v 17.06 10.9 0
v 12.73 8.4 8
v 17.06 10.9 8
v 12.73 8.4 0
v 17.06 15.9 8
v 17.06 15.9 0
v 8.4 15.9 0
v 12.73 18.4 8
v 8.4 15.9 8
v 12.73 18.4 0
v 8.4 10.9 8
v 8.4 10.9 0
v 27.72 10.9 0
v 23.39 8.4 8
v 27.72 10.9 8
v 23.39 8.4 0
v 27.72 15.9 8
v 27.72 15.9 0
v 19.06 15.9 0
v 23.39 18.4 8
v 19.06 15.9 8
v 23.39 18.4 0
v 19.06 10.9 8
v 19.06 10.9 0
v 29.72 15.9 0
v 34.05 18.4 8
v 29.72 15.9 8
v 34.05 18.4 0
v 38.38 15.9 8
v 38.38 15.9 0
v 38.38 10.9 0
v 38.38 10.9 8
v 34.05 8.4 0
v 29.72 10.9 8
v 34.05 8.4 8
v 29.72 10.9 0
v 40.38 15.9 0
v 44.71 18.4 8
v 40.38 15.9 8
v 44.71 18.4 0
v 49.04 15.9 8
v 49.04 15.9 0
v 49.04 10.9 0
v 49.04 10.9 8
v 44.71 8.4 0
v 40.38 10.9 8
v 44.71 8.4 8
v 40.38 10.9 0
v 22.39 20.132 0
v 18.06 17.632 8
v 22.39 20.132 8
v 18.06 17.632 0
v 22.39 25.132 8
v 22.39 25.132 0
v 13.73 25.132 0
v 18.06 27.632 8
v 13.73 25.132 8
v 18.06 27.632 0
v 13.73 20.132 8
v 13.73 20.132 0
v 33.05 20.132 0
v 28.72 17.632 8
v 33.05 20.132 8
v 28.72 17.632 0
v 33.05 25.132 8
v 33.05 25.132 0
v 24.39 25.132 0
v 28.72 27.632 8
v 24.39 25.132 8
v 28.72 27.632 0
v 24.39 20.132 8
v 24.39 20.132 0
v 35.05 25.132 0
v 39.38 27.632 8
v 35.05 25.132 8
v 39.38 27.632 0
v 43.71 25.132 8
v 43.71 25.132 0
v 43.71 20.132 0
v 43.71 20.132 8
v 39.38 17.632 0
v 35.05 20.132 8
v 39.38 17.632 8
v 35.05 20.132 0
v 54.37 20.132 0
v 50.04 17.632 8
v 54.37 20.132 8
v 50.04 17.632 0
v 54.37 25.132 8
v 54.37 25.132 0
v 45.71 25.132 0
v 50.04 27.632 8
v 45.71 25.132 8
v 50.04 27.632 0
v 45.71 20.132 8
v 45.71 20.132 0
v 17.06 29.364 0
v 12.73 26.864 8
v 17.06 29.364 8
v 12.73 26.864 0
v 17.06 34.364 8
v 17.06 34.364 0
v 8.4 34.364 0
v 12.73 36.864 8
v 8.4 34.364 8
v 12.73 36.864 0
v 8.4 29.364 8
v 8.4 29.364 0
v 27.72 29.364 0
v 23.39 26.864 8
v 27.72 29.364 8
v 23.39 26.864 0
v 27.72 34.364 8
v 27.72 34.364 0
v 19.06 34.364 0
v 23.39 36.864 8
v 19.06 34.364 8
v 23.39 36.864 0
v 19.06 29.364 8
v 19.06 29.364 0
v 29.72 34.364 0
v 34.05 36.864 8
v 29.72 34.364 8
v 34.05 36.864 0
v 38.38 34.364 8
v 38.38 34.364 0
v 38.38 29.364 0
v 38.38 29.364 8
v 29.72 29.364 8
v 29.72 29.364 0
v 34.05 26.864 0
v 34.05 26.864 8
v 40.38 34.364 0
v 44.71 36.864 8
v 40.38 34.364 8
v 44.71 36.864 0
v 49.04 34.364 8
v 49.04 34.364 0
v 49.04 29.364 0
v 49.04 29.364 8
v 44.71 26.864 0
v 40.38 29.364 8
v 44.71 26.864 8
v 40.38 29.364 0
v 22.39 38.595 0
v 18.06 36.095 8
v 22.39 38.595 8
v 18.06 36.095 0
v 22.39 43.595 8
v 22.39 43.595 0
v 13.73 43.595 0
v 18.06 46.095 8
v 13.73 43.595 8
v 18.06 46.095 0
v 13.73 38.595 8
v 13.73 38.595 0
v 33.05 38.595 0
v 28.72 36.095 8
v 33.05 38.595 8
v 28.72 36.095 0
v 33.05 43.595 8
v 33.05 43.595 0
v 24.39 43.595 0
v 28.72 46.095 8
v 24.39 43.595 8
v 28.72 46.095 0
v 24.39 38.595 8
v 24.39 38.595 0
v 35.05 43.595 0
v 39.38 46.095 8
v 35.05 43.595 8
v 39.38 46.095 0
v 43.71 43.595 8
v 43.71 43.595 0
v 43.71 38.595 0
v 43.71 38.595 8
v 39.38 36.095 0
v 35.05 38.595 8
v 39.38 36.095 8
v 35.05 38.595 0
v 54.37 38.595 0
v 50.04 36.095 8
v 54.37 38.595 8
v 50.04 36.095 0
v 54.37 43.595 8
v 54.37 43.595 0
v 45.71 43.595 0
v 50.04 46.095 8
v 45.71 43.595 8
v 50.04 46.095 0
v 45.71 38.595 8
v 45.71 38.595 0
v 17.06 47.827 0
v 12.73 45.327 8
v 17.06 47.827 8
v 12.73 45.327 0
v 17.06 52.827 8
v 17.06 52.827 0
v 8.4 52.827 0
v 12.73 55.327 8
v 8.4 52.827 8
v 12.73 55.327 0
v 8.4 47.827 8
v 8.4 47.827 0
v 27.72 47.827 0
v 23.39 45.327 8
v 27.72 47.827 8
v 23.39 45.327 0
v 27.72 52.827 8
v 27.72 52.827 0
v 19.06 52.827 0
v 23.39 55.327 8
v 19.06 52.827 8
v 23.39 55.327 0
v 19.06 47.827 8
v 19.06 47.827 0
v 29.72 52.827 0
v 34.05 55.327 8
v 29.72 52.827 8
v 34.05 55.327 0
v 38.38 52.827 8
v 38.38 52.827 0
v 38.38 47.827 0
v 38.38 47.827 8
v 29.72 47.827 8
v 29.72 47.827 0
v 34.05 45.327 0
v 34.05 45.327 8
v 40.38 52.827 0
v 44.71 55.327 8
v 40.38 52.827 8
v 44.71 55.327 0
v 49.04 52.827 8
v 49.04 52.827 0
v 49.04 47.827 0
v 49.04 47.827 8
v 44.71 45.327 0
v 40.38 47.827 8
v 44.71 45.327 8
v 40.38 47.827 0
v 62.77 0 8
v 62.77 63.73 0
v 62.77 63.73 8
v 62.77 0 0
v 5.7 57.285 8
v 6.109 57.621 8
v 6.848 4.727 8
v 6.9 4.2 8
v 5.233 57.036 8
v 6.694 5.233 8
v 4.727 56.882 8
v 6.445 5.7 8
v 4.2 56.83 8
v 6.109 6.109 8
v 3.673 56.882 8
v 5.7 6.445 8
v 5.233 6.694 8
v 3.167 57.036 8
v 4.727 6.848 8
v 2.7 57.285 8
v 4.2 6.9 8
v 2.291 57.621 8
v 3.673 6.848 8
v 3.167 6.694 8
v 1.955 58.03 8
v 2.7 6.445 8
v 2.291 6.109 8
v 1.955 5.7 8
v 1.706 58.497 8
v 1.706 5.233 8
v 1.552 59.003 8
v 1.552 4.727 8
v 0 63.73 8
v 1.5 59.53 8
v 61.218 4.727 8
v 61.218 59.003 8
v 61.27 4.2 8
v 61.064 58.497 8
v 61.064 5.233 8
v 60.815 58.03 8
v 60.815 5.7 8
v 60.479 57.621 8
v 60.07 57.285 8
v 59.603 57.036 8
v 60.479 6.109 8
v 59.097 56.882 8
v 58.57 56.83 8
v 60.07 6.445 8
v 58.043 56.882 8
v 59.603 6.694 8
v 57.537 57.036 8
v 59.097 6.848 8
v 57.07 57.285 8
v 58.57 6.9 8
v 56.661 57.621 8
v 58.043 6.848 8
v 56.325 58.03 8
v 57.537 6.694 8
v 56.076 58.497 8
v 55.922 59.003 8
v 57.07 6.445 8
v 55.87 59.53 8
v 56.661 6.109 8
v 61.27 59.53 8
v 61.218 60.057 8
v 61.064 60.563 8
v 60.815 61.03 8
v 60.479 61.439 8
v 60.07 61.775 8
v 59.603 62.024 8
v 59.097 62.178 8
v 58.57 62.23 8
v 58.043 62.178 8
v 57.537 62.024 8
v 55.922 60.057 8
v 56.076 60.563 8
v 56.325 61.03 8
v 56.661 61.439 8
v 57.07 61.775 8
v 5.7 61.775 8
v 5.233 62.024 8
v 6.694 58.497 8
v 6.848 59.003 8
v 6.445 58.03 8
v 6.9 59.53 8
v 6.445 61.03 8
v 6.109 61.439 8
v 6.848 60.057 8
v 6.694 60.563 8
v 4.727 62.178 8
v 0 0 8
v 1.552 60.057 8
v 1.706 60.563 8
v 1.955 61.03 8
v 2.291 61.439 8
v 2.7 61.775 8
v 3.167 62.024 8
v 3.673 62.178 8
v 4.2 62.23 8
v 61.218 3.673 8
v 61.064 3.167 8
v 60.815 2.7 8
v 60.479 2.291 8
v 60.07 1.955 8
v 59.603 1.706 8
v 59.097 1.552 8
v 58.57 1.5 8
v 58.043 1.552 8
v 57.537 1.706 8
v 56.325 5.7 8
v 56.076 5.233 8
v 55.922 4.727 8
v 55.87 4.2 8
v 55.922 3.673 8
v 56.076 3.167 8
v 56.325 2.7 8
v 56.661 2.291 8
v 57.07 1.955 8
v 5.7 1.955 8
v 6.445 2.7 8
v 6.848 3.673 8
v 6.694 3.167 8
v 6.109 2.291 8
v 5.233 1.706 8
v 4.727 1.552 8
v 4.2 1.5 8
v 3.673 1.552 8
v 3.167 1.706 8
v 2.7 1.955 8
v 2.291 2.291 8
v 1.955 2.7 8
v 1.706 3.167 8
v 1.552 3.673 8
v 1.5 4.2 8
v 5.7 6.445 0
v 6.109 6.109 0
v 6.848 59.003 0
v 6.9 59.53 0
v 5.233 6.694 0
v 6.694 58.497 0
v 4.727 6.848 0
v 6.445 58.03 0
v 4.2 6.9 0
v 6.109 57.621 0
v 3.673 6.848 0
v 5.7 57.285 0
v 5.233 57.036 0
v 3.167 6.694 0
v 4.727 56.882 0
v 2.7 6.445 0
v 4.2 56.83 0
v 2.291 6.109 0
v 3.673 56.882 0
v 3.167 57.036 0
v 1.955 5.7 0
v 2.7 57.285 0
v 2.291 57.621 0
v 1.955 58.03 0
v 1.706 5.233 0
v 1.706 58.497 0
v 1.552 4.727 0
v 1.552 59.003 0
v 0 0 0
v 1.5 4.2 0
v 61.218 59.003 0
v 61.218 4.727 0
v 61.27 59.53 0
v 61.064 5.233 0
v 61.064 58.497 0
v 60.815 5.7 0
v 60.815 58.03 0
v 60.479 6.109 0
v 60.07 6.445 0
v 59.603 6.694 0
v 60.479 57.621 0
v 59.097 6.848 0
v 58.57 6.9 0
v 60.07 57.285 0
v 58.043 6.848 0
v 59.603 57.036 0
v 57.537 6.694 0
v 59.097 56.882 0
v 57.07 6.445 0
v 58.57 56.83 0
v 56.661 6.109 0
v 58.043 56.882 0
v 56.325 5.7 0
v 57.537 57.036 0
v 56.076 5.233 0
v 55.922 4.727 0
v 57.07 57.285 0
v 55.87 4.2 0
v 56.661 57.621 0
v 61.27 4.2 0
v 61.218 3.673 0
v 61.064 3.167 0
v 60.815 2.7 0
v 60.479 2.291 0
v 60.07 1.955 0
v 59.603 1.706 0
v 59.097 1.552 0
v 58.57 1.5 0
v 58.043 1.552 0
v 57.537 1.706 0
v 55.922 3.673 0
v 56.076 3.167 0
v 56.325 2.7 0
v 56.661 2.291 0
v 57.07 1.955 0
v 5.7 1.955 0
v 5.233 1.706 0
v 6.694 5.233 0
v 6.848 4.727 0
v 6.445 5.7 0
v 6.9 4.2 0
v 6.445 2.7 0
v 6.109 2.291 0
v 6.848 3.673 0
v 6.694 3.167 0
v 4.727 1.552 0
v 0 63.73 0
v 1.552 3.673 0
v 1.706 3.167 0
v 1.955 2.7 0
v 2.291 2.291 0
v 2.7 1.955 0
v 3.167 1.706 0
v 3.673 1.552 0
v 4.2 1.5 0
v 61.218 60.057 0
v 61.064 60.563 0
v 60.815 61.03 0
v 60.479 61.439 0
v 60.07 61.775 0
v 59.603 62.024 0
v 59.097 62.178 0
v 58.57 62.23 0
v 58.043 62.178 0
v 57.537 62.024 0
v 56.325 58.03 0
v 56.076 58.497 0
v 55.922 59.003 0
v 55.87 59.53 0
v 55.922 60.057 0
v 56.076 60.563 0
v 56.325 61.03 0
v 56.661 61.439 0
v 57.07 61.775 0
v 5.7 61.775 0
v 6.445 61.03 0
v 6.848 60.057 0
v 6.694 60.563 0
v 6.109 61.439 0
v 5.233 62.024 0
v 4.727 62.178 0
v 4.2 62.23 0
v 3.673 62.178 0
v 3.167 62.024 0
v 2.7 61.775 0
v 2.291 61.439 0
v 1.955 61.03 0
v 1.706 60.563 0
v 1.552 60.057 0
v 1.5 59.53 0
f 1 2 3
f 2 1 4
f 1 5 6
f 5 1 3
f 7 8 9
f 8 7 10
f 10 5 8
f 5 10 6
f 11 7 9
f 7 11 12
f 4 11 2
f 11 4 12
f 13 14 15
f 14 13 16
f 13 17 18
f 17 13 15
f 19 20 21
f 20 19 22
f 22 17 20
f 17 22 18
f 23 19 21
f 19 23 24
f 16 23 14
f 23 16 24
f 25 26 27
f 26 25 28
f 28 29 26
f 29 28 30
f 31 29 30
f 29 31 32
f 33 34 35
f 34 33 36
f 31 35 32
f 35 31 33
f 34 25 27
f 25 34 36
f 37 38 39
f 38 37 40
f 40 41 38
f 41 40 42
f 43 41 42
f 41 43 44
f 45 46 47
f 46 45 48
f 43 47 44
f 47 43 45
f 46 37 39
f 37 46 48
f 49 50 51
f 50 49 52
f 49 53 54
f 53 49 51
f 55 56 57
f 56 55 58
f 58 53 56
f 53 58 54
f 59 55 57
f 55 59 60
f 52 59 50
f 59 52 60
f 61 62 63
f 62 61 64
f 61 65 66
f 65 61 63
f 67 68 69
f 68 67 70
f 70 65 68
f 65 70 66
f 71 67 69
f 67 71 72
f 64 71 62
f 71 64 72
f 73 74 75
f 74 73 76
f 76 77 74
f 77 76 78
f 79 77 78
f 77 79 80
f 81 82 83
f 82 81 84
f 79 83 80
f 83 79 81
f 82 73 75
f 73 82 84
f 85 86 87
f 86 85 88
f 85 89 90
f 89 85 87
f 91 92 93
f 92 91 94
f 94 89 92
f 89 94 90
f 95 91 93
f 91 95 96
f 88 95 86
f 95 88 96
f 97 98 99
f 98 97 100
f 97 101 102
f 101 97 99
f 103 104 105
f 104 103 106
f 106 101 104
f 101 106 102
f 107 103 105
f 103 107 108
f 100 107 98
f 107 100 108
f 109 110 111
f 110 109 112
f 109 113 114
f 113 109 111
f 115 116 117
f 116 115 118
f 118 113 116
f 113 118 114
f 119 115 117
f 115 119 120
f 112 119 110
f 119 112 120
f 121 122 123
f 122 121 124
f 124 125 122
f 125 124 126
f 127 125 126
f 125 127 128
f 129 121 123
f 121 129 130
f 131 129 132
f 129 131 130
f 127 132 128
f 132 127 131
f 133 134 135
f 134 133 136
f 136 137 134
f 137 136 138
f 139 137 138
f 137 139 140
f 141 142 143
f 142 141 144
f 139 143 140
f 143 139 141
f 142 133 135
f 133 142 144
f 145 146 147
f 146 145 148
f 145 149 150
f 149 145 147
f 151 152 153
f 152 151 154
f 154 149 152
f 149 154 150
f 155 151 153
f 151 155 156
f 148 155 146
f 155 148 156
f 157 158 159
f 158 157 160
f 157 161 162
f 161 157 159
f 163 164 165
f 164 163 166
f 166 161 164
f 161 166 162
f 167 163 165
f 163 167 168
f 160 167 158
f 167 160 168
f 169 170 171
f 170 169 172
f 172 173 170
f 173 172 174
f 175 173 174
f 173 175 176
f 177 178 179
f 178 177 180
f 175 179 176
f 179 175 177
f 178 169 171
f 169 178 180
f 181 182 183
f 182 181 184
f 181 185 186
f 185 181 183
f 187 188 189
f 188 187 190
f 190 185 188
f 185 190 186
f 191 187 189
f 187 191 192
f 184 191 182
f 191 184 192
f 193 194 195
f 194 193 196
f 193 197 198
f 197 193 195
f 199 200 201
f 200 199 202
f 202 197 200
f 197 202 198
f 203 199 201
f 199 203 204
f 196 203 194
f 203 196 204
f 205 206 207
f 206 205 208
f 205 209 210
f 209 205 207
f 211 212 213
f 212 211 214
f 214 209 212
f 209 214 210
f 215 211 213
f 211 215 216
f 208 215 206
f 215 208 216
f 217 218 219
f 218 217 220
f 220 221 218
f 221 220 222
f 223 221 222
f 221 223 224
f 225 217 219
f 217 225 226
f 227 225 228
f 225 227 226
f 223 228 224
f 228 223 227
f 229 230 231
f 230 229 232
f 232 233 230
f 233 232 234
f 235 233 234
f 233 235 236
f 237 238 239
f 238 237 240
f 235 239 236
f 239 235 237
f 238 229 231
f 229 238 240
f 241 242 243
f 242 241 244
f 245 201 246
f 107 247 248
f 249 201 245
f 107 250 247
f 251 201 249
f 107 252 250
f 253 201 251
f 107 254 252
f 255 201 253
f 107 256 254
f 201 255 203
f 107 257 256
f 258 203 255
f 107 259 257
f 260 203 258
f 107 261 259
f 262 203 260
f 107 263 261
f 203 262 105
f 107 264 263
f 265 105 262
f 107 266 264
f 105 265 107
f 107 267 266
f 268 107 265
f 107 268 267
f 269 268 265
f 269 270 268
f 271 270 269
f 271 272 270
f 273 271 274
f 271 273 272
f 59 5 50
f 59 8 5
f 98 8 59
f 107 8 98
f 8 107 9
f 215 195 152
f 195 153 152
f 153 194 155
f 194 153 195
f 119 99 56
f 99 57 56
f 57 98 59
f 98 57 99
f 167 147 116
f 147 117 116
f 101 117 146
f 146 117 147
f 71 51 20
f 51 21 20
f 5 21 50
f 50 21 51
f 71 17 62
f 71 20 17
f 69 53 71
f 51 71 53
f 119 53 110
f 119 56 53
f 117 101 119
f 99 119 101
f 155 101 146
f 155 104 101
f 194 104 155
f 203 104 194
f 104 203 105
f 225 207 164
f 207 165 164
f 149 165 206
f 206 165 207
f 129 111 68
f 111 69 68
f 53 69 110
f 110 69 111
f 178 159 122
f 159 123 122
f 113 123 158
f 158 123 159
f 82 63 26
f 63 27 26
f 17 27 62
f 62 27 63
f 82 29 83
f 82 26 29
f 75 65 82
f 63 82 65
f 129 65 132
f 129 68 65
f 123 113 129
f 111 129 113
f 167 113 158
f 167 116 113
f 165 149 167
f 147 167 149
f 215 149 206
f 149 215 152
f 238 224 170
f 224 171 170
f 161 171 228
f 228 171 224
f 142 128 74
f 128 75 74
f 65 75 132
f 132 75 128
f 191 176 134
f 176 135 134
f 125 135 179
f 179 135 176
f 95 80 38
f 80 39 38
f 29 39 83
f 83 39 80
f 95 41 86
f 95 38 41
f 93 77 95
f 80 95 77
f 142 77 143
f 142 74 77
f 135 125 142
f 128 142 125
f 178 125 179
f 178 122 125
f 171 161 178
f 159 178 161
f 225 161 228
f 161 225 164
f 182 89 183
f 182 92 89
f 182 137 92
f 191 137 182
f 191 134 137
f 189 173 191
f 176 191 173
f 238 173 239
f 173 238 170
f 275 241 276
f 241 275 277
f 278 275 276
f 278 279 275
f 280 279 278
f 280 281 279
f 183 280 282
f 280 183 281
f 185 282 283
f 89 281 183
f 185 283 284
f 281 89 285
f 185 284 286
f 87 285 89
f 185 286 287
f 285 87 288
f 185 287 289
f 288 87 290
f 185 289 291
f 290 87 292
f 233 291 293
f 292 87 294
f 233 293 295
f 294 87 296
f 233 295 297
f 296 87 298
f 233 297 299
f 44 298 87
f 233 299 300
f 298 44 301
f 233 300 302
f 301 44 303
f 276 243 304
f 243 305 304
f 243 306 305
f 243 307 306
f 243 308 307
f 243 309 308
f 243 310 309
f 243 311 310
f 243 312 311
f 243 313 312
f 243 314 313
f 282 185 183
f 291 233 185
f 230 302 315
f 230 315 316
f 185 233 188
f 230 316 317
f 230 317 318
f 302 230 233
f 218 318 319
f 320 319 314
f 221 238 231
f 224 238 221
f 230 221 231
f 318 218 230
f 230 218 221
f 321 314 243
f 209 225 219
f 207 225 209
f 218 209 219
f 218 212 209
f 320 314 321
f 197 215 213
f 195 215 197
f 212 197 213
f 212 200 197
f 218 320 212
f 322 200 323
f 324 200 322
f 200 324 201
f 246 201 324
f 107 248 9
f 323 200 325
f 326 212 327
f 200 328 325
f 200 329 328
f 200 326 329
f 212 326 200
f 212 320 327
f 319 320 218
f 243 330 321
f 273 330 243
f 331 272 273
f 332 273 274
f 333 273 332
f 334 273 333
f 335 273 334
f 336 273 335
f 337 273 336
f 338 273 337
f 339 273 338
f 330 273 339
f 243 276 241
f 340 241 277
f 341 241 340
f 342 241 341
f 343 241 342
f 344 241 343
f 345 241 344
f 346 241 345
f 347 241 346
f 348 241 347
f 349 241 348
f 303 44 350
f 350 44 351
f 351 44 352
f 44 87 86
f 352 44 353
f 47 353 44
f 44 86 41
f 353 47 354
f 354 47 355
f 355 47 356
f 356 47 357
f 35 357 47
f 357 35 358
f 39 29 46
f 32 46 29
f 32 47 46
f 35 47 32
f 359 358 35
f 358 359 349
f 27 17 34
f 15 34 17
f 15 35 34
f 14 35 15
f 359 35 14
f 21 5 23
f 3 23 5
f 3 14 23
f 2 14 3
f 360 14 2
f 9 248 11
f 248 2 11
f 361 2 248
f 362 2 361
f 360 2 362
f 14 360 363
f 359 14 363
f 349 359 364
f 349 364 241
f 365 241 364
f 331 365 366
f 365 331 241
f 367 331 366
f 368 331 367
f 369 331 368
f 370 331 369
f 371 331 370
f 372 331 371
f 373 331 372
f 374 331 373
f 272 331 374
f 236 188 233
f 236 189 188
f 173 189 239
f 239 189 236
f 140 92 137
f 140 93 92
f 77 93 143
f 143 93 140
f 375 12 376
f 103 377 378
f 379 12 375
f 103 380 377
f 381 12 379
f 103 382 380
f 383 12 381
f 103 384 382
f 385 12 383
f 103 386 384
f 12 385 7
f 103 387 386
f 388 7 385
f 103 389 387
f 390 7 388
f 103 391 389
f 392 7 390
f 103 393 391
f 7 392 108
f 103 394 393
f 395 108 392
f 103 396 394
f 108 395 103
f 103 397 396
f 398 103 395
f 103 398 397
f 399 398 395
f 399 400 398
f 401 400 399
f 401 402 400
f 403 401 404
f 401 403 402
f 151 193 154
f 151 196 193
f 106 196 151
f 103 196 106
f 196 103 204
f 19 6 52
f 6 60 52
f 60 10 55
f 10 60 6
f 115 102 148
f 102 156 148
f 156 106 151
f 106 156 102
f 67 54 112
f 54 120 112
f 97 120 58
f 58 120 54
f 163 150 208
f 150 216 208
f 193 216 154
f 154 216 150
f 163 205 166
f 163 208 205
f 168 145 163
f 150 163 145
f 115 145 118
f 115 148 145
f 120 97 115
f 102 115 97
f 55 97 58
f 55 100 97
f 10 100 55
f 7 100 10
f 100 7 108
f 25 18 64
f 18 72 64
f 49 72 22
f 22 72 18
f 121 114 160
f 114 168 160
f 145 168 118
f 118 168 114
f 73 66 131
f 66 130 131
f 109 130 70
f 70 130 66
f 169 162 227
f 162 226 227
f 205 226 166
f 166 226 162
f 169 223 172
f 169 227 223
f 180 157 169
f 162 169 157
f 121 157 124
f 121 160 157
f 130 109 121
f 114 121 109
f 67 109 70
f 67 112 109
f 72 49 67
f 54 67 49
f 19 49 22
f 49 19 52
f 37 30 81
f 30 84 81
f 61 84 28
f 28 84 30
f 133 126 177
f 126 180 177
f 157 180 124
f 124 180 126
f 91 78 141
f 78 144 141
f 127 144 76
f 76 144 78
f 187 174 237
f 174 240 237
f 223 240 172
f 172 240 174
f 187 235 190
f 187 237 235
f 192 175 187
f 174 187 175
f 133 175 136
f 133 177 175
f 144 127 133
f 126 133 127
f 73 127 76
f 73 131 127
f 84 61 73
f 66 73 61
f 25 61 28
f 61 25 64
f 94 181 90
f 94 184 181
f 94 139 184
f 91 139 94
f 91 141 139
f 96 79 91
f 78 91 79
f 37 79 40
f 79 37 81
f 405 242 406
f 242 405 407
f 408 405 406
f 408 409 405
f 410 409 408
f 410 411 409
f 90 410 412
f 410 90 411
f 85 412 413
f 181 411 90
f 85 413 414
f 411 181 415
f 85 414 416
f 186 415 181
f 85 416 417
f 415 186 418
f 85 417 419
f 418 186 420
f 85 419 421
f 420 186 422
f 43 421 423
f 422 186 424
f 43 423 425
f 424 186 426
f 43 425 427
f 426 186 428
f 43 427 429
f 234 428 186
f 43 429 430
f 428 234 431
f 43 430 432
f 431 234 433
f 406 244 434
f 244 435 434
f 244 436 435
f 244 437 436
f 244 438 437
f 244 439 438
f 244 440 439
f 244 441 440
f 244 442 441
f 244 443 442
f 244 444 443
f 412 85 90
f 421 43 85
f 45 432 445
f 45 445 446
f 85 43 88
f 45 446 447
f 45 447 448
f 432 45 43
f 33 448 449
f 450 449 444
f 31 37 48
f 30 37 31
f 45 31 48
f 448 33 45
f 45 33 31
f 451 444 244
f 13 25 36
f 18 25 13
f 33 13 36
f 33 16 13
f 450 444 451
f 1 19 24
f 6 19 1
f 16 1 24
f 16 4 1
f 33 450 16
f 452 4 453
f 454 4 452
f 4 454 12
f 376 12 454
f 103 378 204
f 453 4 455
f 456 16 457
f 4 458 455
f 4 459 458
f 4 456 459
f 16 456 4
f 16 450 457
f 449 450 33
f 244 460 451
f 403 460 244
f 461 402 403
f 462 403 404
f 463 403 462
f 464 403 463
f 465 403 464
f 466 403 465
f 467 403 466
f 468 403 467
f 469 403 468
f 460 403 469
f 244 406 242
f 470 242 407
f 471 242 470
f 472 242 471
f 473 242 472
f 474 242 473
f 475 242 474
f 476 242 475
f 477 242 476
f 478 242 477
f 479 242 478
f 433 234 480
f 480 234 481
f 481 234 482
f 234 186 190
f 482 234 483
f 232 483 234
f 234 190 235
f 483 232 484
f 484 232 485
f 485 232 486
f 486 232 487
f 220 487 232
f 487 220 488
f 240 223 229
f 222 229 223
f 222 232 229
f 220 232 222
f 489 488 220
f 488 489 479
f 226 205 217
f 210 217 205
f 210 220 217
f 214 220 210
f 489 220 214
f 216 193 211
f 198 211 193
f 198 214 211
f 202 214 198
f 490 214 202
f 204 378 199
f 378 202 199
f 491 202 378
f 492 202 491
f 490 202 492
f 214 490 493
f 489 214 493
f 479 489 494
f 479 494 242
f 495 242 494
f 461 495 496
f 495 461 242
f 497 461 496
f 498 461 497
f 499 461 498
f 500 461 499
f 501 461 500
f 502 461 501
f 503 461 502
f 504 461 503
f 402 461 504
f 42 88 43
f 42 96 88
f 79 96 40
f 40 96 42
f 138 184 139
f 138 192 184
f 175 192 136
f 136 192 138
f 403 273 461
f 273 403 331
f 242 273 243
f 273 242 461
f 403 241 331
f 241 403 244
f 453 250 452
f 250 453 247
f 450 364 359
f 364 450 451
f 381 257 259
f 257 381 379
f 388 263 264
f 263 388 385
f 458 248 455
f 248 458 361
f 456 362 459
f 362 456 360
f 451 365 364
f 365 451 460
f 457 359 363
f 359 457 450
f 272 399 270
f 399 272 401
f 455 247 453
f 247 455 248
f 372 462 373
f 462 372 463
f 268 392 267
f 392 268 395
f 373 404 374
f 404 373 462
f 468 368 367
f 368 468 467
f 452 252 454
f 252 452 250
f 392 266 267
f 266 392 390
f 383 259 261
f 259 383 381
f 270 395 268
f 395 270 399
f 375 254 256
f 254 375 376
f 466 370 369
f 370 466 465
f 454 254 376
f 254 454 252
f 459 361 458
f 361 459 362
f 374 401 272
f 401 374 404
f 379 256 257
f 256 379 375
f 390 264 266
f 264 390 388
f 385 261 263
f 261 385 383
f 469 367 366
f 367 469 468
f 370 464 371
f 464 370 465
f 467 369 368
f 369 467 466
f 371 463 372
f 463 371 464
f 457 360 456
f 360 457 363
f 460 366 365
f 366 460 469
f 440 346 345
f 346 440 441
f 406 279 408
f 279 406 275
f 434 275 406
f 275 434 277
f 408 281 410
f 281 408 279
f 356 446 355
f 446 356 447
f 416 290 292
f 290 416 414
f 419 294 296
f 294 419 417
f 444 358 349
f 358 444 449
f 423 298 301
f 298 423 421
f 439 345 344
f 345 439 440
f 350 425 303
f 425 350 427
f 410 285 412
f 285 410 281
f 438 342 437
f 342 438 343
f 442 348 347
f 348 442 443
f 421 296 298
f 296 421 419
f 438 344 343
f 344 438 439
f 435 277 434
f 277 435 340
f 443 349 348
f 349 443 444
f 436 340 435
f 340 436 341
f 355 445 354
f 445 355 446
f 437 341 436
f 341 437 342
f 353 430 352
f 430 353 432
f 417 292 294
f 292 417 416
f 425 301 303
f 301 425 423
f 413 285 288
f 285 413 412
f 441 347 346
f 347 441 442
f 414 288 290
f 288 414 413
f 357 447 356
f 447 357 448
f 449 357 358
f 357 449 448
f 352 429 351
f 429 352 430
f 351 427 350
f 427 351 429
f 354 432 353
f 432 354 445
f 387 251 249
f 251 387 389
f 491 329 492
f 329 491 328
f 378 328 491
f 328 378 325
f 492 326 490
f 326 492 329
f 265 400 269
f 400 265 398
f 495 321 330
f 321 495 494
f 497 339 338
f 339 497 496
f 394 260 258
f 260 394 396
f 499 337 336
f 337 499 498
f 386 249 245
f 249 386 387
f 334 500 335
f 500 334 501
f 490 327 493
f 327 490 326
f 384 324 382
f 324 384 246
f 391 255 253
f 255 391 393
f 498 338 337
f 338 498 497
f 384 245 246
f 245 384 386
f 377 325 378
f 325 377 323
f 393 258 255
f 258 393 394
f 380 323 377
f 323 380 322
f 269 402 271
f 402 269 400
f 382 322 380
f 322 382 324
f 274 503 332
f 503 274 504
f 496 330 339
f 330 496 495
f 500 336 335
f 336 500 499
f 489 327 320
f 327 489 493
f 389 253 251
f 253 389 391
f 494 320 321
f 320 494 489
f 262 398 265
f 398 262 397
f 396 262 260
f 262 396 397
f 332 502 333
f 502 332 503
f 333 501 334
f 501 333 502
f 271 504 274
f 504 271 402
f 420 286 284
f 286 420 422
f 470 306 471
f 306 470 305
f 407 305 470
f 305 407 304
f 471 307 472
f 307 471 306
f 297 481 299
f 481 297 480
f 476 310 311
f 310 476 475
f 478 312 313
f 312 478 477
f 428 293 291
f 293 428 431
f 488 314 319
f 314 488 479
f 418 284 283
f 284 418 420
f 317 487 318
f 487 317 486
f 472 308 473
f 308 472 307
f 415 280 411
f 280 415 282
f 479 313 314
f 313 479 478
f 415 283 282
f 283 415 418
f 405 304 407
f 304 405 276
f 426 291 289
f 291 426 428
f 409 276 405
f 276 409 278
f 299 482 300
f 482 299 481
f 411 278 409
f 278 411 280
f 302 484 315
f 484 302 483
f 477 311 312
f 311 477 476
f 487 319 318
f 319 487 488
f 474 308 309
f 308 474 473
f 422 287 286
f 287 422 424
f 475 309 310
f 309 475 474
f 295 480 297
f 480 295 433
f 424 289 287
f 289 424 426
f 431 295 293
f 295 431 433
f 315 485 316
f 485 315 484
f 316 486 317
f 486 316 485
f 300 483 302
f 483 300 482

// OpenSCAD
$fn = 32;

// ----------------------------------------------------------------------
// Honeycomb panel: 62.77 x 63.73 mm, 20 cells of 10 mm
// ----------------------------------------------------------------------

// --- parameters (mm) ---
panel_w = 62.77;          // panel width
panel_d = 63.73;          // panel depth
thick = 8;                // panel thickness
cell_r = 5;               // hex cell circumradius
pitch = 10.66;            // hex cell pitch (centre to centre)
web = 2;                  // web between the cells
columns = 4;              // columns of cells
rows = 5;                 // rows of cells
cell_count = 20;          // total cells
shift_x = 12.73;          // first cell offset in x
shift_y = 13.4;           // first cell offset in y
mount_d = 5.4;            // corner mounting holes
hole_off = 4.2;           // mounting hole offset from the corners

difference() {
  union() {
    cube([panel_w, panel_d, thick]);
  }
  /* hexagonal cells, point-up, cut right through the plate */
  for (row = [0 : rows - 1]) {
    for (col = [0 : columns - 1]) {
      translate([shift_x + col * pitch + (row % 2) * pitch / 2, shift_y + row * pitch * 0.866025, -2.5]) rotate([0, 0, 30]) cylinder(h = thick + 5, d = 2 * cell_r, $fn = 6);
    }
  }
  /* corner mounting holes, clear of the outer cell web */
  translate([4.2, 4.2, -2.5]) cylinder(h = thick + 5, d = mount_d);
  translate([58.57, 4.2, -2.5]) cylinder(h = thick + 5, d = mount_d);
  translate([4.2, 59.53, -2.5]) cylinder(h = thick + 5, d = mount_d);
  translate([58.57, 59.53, -2.5]) cylinder(h = thick + 5, d = mount_d);
}
